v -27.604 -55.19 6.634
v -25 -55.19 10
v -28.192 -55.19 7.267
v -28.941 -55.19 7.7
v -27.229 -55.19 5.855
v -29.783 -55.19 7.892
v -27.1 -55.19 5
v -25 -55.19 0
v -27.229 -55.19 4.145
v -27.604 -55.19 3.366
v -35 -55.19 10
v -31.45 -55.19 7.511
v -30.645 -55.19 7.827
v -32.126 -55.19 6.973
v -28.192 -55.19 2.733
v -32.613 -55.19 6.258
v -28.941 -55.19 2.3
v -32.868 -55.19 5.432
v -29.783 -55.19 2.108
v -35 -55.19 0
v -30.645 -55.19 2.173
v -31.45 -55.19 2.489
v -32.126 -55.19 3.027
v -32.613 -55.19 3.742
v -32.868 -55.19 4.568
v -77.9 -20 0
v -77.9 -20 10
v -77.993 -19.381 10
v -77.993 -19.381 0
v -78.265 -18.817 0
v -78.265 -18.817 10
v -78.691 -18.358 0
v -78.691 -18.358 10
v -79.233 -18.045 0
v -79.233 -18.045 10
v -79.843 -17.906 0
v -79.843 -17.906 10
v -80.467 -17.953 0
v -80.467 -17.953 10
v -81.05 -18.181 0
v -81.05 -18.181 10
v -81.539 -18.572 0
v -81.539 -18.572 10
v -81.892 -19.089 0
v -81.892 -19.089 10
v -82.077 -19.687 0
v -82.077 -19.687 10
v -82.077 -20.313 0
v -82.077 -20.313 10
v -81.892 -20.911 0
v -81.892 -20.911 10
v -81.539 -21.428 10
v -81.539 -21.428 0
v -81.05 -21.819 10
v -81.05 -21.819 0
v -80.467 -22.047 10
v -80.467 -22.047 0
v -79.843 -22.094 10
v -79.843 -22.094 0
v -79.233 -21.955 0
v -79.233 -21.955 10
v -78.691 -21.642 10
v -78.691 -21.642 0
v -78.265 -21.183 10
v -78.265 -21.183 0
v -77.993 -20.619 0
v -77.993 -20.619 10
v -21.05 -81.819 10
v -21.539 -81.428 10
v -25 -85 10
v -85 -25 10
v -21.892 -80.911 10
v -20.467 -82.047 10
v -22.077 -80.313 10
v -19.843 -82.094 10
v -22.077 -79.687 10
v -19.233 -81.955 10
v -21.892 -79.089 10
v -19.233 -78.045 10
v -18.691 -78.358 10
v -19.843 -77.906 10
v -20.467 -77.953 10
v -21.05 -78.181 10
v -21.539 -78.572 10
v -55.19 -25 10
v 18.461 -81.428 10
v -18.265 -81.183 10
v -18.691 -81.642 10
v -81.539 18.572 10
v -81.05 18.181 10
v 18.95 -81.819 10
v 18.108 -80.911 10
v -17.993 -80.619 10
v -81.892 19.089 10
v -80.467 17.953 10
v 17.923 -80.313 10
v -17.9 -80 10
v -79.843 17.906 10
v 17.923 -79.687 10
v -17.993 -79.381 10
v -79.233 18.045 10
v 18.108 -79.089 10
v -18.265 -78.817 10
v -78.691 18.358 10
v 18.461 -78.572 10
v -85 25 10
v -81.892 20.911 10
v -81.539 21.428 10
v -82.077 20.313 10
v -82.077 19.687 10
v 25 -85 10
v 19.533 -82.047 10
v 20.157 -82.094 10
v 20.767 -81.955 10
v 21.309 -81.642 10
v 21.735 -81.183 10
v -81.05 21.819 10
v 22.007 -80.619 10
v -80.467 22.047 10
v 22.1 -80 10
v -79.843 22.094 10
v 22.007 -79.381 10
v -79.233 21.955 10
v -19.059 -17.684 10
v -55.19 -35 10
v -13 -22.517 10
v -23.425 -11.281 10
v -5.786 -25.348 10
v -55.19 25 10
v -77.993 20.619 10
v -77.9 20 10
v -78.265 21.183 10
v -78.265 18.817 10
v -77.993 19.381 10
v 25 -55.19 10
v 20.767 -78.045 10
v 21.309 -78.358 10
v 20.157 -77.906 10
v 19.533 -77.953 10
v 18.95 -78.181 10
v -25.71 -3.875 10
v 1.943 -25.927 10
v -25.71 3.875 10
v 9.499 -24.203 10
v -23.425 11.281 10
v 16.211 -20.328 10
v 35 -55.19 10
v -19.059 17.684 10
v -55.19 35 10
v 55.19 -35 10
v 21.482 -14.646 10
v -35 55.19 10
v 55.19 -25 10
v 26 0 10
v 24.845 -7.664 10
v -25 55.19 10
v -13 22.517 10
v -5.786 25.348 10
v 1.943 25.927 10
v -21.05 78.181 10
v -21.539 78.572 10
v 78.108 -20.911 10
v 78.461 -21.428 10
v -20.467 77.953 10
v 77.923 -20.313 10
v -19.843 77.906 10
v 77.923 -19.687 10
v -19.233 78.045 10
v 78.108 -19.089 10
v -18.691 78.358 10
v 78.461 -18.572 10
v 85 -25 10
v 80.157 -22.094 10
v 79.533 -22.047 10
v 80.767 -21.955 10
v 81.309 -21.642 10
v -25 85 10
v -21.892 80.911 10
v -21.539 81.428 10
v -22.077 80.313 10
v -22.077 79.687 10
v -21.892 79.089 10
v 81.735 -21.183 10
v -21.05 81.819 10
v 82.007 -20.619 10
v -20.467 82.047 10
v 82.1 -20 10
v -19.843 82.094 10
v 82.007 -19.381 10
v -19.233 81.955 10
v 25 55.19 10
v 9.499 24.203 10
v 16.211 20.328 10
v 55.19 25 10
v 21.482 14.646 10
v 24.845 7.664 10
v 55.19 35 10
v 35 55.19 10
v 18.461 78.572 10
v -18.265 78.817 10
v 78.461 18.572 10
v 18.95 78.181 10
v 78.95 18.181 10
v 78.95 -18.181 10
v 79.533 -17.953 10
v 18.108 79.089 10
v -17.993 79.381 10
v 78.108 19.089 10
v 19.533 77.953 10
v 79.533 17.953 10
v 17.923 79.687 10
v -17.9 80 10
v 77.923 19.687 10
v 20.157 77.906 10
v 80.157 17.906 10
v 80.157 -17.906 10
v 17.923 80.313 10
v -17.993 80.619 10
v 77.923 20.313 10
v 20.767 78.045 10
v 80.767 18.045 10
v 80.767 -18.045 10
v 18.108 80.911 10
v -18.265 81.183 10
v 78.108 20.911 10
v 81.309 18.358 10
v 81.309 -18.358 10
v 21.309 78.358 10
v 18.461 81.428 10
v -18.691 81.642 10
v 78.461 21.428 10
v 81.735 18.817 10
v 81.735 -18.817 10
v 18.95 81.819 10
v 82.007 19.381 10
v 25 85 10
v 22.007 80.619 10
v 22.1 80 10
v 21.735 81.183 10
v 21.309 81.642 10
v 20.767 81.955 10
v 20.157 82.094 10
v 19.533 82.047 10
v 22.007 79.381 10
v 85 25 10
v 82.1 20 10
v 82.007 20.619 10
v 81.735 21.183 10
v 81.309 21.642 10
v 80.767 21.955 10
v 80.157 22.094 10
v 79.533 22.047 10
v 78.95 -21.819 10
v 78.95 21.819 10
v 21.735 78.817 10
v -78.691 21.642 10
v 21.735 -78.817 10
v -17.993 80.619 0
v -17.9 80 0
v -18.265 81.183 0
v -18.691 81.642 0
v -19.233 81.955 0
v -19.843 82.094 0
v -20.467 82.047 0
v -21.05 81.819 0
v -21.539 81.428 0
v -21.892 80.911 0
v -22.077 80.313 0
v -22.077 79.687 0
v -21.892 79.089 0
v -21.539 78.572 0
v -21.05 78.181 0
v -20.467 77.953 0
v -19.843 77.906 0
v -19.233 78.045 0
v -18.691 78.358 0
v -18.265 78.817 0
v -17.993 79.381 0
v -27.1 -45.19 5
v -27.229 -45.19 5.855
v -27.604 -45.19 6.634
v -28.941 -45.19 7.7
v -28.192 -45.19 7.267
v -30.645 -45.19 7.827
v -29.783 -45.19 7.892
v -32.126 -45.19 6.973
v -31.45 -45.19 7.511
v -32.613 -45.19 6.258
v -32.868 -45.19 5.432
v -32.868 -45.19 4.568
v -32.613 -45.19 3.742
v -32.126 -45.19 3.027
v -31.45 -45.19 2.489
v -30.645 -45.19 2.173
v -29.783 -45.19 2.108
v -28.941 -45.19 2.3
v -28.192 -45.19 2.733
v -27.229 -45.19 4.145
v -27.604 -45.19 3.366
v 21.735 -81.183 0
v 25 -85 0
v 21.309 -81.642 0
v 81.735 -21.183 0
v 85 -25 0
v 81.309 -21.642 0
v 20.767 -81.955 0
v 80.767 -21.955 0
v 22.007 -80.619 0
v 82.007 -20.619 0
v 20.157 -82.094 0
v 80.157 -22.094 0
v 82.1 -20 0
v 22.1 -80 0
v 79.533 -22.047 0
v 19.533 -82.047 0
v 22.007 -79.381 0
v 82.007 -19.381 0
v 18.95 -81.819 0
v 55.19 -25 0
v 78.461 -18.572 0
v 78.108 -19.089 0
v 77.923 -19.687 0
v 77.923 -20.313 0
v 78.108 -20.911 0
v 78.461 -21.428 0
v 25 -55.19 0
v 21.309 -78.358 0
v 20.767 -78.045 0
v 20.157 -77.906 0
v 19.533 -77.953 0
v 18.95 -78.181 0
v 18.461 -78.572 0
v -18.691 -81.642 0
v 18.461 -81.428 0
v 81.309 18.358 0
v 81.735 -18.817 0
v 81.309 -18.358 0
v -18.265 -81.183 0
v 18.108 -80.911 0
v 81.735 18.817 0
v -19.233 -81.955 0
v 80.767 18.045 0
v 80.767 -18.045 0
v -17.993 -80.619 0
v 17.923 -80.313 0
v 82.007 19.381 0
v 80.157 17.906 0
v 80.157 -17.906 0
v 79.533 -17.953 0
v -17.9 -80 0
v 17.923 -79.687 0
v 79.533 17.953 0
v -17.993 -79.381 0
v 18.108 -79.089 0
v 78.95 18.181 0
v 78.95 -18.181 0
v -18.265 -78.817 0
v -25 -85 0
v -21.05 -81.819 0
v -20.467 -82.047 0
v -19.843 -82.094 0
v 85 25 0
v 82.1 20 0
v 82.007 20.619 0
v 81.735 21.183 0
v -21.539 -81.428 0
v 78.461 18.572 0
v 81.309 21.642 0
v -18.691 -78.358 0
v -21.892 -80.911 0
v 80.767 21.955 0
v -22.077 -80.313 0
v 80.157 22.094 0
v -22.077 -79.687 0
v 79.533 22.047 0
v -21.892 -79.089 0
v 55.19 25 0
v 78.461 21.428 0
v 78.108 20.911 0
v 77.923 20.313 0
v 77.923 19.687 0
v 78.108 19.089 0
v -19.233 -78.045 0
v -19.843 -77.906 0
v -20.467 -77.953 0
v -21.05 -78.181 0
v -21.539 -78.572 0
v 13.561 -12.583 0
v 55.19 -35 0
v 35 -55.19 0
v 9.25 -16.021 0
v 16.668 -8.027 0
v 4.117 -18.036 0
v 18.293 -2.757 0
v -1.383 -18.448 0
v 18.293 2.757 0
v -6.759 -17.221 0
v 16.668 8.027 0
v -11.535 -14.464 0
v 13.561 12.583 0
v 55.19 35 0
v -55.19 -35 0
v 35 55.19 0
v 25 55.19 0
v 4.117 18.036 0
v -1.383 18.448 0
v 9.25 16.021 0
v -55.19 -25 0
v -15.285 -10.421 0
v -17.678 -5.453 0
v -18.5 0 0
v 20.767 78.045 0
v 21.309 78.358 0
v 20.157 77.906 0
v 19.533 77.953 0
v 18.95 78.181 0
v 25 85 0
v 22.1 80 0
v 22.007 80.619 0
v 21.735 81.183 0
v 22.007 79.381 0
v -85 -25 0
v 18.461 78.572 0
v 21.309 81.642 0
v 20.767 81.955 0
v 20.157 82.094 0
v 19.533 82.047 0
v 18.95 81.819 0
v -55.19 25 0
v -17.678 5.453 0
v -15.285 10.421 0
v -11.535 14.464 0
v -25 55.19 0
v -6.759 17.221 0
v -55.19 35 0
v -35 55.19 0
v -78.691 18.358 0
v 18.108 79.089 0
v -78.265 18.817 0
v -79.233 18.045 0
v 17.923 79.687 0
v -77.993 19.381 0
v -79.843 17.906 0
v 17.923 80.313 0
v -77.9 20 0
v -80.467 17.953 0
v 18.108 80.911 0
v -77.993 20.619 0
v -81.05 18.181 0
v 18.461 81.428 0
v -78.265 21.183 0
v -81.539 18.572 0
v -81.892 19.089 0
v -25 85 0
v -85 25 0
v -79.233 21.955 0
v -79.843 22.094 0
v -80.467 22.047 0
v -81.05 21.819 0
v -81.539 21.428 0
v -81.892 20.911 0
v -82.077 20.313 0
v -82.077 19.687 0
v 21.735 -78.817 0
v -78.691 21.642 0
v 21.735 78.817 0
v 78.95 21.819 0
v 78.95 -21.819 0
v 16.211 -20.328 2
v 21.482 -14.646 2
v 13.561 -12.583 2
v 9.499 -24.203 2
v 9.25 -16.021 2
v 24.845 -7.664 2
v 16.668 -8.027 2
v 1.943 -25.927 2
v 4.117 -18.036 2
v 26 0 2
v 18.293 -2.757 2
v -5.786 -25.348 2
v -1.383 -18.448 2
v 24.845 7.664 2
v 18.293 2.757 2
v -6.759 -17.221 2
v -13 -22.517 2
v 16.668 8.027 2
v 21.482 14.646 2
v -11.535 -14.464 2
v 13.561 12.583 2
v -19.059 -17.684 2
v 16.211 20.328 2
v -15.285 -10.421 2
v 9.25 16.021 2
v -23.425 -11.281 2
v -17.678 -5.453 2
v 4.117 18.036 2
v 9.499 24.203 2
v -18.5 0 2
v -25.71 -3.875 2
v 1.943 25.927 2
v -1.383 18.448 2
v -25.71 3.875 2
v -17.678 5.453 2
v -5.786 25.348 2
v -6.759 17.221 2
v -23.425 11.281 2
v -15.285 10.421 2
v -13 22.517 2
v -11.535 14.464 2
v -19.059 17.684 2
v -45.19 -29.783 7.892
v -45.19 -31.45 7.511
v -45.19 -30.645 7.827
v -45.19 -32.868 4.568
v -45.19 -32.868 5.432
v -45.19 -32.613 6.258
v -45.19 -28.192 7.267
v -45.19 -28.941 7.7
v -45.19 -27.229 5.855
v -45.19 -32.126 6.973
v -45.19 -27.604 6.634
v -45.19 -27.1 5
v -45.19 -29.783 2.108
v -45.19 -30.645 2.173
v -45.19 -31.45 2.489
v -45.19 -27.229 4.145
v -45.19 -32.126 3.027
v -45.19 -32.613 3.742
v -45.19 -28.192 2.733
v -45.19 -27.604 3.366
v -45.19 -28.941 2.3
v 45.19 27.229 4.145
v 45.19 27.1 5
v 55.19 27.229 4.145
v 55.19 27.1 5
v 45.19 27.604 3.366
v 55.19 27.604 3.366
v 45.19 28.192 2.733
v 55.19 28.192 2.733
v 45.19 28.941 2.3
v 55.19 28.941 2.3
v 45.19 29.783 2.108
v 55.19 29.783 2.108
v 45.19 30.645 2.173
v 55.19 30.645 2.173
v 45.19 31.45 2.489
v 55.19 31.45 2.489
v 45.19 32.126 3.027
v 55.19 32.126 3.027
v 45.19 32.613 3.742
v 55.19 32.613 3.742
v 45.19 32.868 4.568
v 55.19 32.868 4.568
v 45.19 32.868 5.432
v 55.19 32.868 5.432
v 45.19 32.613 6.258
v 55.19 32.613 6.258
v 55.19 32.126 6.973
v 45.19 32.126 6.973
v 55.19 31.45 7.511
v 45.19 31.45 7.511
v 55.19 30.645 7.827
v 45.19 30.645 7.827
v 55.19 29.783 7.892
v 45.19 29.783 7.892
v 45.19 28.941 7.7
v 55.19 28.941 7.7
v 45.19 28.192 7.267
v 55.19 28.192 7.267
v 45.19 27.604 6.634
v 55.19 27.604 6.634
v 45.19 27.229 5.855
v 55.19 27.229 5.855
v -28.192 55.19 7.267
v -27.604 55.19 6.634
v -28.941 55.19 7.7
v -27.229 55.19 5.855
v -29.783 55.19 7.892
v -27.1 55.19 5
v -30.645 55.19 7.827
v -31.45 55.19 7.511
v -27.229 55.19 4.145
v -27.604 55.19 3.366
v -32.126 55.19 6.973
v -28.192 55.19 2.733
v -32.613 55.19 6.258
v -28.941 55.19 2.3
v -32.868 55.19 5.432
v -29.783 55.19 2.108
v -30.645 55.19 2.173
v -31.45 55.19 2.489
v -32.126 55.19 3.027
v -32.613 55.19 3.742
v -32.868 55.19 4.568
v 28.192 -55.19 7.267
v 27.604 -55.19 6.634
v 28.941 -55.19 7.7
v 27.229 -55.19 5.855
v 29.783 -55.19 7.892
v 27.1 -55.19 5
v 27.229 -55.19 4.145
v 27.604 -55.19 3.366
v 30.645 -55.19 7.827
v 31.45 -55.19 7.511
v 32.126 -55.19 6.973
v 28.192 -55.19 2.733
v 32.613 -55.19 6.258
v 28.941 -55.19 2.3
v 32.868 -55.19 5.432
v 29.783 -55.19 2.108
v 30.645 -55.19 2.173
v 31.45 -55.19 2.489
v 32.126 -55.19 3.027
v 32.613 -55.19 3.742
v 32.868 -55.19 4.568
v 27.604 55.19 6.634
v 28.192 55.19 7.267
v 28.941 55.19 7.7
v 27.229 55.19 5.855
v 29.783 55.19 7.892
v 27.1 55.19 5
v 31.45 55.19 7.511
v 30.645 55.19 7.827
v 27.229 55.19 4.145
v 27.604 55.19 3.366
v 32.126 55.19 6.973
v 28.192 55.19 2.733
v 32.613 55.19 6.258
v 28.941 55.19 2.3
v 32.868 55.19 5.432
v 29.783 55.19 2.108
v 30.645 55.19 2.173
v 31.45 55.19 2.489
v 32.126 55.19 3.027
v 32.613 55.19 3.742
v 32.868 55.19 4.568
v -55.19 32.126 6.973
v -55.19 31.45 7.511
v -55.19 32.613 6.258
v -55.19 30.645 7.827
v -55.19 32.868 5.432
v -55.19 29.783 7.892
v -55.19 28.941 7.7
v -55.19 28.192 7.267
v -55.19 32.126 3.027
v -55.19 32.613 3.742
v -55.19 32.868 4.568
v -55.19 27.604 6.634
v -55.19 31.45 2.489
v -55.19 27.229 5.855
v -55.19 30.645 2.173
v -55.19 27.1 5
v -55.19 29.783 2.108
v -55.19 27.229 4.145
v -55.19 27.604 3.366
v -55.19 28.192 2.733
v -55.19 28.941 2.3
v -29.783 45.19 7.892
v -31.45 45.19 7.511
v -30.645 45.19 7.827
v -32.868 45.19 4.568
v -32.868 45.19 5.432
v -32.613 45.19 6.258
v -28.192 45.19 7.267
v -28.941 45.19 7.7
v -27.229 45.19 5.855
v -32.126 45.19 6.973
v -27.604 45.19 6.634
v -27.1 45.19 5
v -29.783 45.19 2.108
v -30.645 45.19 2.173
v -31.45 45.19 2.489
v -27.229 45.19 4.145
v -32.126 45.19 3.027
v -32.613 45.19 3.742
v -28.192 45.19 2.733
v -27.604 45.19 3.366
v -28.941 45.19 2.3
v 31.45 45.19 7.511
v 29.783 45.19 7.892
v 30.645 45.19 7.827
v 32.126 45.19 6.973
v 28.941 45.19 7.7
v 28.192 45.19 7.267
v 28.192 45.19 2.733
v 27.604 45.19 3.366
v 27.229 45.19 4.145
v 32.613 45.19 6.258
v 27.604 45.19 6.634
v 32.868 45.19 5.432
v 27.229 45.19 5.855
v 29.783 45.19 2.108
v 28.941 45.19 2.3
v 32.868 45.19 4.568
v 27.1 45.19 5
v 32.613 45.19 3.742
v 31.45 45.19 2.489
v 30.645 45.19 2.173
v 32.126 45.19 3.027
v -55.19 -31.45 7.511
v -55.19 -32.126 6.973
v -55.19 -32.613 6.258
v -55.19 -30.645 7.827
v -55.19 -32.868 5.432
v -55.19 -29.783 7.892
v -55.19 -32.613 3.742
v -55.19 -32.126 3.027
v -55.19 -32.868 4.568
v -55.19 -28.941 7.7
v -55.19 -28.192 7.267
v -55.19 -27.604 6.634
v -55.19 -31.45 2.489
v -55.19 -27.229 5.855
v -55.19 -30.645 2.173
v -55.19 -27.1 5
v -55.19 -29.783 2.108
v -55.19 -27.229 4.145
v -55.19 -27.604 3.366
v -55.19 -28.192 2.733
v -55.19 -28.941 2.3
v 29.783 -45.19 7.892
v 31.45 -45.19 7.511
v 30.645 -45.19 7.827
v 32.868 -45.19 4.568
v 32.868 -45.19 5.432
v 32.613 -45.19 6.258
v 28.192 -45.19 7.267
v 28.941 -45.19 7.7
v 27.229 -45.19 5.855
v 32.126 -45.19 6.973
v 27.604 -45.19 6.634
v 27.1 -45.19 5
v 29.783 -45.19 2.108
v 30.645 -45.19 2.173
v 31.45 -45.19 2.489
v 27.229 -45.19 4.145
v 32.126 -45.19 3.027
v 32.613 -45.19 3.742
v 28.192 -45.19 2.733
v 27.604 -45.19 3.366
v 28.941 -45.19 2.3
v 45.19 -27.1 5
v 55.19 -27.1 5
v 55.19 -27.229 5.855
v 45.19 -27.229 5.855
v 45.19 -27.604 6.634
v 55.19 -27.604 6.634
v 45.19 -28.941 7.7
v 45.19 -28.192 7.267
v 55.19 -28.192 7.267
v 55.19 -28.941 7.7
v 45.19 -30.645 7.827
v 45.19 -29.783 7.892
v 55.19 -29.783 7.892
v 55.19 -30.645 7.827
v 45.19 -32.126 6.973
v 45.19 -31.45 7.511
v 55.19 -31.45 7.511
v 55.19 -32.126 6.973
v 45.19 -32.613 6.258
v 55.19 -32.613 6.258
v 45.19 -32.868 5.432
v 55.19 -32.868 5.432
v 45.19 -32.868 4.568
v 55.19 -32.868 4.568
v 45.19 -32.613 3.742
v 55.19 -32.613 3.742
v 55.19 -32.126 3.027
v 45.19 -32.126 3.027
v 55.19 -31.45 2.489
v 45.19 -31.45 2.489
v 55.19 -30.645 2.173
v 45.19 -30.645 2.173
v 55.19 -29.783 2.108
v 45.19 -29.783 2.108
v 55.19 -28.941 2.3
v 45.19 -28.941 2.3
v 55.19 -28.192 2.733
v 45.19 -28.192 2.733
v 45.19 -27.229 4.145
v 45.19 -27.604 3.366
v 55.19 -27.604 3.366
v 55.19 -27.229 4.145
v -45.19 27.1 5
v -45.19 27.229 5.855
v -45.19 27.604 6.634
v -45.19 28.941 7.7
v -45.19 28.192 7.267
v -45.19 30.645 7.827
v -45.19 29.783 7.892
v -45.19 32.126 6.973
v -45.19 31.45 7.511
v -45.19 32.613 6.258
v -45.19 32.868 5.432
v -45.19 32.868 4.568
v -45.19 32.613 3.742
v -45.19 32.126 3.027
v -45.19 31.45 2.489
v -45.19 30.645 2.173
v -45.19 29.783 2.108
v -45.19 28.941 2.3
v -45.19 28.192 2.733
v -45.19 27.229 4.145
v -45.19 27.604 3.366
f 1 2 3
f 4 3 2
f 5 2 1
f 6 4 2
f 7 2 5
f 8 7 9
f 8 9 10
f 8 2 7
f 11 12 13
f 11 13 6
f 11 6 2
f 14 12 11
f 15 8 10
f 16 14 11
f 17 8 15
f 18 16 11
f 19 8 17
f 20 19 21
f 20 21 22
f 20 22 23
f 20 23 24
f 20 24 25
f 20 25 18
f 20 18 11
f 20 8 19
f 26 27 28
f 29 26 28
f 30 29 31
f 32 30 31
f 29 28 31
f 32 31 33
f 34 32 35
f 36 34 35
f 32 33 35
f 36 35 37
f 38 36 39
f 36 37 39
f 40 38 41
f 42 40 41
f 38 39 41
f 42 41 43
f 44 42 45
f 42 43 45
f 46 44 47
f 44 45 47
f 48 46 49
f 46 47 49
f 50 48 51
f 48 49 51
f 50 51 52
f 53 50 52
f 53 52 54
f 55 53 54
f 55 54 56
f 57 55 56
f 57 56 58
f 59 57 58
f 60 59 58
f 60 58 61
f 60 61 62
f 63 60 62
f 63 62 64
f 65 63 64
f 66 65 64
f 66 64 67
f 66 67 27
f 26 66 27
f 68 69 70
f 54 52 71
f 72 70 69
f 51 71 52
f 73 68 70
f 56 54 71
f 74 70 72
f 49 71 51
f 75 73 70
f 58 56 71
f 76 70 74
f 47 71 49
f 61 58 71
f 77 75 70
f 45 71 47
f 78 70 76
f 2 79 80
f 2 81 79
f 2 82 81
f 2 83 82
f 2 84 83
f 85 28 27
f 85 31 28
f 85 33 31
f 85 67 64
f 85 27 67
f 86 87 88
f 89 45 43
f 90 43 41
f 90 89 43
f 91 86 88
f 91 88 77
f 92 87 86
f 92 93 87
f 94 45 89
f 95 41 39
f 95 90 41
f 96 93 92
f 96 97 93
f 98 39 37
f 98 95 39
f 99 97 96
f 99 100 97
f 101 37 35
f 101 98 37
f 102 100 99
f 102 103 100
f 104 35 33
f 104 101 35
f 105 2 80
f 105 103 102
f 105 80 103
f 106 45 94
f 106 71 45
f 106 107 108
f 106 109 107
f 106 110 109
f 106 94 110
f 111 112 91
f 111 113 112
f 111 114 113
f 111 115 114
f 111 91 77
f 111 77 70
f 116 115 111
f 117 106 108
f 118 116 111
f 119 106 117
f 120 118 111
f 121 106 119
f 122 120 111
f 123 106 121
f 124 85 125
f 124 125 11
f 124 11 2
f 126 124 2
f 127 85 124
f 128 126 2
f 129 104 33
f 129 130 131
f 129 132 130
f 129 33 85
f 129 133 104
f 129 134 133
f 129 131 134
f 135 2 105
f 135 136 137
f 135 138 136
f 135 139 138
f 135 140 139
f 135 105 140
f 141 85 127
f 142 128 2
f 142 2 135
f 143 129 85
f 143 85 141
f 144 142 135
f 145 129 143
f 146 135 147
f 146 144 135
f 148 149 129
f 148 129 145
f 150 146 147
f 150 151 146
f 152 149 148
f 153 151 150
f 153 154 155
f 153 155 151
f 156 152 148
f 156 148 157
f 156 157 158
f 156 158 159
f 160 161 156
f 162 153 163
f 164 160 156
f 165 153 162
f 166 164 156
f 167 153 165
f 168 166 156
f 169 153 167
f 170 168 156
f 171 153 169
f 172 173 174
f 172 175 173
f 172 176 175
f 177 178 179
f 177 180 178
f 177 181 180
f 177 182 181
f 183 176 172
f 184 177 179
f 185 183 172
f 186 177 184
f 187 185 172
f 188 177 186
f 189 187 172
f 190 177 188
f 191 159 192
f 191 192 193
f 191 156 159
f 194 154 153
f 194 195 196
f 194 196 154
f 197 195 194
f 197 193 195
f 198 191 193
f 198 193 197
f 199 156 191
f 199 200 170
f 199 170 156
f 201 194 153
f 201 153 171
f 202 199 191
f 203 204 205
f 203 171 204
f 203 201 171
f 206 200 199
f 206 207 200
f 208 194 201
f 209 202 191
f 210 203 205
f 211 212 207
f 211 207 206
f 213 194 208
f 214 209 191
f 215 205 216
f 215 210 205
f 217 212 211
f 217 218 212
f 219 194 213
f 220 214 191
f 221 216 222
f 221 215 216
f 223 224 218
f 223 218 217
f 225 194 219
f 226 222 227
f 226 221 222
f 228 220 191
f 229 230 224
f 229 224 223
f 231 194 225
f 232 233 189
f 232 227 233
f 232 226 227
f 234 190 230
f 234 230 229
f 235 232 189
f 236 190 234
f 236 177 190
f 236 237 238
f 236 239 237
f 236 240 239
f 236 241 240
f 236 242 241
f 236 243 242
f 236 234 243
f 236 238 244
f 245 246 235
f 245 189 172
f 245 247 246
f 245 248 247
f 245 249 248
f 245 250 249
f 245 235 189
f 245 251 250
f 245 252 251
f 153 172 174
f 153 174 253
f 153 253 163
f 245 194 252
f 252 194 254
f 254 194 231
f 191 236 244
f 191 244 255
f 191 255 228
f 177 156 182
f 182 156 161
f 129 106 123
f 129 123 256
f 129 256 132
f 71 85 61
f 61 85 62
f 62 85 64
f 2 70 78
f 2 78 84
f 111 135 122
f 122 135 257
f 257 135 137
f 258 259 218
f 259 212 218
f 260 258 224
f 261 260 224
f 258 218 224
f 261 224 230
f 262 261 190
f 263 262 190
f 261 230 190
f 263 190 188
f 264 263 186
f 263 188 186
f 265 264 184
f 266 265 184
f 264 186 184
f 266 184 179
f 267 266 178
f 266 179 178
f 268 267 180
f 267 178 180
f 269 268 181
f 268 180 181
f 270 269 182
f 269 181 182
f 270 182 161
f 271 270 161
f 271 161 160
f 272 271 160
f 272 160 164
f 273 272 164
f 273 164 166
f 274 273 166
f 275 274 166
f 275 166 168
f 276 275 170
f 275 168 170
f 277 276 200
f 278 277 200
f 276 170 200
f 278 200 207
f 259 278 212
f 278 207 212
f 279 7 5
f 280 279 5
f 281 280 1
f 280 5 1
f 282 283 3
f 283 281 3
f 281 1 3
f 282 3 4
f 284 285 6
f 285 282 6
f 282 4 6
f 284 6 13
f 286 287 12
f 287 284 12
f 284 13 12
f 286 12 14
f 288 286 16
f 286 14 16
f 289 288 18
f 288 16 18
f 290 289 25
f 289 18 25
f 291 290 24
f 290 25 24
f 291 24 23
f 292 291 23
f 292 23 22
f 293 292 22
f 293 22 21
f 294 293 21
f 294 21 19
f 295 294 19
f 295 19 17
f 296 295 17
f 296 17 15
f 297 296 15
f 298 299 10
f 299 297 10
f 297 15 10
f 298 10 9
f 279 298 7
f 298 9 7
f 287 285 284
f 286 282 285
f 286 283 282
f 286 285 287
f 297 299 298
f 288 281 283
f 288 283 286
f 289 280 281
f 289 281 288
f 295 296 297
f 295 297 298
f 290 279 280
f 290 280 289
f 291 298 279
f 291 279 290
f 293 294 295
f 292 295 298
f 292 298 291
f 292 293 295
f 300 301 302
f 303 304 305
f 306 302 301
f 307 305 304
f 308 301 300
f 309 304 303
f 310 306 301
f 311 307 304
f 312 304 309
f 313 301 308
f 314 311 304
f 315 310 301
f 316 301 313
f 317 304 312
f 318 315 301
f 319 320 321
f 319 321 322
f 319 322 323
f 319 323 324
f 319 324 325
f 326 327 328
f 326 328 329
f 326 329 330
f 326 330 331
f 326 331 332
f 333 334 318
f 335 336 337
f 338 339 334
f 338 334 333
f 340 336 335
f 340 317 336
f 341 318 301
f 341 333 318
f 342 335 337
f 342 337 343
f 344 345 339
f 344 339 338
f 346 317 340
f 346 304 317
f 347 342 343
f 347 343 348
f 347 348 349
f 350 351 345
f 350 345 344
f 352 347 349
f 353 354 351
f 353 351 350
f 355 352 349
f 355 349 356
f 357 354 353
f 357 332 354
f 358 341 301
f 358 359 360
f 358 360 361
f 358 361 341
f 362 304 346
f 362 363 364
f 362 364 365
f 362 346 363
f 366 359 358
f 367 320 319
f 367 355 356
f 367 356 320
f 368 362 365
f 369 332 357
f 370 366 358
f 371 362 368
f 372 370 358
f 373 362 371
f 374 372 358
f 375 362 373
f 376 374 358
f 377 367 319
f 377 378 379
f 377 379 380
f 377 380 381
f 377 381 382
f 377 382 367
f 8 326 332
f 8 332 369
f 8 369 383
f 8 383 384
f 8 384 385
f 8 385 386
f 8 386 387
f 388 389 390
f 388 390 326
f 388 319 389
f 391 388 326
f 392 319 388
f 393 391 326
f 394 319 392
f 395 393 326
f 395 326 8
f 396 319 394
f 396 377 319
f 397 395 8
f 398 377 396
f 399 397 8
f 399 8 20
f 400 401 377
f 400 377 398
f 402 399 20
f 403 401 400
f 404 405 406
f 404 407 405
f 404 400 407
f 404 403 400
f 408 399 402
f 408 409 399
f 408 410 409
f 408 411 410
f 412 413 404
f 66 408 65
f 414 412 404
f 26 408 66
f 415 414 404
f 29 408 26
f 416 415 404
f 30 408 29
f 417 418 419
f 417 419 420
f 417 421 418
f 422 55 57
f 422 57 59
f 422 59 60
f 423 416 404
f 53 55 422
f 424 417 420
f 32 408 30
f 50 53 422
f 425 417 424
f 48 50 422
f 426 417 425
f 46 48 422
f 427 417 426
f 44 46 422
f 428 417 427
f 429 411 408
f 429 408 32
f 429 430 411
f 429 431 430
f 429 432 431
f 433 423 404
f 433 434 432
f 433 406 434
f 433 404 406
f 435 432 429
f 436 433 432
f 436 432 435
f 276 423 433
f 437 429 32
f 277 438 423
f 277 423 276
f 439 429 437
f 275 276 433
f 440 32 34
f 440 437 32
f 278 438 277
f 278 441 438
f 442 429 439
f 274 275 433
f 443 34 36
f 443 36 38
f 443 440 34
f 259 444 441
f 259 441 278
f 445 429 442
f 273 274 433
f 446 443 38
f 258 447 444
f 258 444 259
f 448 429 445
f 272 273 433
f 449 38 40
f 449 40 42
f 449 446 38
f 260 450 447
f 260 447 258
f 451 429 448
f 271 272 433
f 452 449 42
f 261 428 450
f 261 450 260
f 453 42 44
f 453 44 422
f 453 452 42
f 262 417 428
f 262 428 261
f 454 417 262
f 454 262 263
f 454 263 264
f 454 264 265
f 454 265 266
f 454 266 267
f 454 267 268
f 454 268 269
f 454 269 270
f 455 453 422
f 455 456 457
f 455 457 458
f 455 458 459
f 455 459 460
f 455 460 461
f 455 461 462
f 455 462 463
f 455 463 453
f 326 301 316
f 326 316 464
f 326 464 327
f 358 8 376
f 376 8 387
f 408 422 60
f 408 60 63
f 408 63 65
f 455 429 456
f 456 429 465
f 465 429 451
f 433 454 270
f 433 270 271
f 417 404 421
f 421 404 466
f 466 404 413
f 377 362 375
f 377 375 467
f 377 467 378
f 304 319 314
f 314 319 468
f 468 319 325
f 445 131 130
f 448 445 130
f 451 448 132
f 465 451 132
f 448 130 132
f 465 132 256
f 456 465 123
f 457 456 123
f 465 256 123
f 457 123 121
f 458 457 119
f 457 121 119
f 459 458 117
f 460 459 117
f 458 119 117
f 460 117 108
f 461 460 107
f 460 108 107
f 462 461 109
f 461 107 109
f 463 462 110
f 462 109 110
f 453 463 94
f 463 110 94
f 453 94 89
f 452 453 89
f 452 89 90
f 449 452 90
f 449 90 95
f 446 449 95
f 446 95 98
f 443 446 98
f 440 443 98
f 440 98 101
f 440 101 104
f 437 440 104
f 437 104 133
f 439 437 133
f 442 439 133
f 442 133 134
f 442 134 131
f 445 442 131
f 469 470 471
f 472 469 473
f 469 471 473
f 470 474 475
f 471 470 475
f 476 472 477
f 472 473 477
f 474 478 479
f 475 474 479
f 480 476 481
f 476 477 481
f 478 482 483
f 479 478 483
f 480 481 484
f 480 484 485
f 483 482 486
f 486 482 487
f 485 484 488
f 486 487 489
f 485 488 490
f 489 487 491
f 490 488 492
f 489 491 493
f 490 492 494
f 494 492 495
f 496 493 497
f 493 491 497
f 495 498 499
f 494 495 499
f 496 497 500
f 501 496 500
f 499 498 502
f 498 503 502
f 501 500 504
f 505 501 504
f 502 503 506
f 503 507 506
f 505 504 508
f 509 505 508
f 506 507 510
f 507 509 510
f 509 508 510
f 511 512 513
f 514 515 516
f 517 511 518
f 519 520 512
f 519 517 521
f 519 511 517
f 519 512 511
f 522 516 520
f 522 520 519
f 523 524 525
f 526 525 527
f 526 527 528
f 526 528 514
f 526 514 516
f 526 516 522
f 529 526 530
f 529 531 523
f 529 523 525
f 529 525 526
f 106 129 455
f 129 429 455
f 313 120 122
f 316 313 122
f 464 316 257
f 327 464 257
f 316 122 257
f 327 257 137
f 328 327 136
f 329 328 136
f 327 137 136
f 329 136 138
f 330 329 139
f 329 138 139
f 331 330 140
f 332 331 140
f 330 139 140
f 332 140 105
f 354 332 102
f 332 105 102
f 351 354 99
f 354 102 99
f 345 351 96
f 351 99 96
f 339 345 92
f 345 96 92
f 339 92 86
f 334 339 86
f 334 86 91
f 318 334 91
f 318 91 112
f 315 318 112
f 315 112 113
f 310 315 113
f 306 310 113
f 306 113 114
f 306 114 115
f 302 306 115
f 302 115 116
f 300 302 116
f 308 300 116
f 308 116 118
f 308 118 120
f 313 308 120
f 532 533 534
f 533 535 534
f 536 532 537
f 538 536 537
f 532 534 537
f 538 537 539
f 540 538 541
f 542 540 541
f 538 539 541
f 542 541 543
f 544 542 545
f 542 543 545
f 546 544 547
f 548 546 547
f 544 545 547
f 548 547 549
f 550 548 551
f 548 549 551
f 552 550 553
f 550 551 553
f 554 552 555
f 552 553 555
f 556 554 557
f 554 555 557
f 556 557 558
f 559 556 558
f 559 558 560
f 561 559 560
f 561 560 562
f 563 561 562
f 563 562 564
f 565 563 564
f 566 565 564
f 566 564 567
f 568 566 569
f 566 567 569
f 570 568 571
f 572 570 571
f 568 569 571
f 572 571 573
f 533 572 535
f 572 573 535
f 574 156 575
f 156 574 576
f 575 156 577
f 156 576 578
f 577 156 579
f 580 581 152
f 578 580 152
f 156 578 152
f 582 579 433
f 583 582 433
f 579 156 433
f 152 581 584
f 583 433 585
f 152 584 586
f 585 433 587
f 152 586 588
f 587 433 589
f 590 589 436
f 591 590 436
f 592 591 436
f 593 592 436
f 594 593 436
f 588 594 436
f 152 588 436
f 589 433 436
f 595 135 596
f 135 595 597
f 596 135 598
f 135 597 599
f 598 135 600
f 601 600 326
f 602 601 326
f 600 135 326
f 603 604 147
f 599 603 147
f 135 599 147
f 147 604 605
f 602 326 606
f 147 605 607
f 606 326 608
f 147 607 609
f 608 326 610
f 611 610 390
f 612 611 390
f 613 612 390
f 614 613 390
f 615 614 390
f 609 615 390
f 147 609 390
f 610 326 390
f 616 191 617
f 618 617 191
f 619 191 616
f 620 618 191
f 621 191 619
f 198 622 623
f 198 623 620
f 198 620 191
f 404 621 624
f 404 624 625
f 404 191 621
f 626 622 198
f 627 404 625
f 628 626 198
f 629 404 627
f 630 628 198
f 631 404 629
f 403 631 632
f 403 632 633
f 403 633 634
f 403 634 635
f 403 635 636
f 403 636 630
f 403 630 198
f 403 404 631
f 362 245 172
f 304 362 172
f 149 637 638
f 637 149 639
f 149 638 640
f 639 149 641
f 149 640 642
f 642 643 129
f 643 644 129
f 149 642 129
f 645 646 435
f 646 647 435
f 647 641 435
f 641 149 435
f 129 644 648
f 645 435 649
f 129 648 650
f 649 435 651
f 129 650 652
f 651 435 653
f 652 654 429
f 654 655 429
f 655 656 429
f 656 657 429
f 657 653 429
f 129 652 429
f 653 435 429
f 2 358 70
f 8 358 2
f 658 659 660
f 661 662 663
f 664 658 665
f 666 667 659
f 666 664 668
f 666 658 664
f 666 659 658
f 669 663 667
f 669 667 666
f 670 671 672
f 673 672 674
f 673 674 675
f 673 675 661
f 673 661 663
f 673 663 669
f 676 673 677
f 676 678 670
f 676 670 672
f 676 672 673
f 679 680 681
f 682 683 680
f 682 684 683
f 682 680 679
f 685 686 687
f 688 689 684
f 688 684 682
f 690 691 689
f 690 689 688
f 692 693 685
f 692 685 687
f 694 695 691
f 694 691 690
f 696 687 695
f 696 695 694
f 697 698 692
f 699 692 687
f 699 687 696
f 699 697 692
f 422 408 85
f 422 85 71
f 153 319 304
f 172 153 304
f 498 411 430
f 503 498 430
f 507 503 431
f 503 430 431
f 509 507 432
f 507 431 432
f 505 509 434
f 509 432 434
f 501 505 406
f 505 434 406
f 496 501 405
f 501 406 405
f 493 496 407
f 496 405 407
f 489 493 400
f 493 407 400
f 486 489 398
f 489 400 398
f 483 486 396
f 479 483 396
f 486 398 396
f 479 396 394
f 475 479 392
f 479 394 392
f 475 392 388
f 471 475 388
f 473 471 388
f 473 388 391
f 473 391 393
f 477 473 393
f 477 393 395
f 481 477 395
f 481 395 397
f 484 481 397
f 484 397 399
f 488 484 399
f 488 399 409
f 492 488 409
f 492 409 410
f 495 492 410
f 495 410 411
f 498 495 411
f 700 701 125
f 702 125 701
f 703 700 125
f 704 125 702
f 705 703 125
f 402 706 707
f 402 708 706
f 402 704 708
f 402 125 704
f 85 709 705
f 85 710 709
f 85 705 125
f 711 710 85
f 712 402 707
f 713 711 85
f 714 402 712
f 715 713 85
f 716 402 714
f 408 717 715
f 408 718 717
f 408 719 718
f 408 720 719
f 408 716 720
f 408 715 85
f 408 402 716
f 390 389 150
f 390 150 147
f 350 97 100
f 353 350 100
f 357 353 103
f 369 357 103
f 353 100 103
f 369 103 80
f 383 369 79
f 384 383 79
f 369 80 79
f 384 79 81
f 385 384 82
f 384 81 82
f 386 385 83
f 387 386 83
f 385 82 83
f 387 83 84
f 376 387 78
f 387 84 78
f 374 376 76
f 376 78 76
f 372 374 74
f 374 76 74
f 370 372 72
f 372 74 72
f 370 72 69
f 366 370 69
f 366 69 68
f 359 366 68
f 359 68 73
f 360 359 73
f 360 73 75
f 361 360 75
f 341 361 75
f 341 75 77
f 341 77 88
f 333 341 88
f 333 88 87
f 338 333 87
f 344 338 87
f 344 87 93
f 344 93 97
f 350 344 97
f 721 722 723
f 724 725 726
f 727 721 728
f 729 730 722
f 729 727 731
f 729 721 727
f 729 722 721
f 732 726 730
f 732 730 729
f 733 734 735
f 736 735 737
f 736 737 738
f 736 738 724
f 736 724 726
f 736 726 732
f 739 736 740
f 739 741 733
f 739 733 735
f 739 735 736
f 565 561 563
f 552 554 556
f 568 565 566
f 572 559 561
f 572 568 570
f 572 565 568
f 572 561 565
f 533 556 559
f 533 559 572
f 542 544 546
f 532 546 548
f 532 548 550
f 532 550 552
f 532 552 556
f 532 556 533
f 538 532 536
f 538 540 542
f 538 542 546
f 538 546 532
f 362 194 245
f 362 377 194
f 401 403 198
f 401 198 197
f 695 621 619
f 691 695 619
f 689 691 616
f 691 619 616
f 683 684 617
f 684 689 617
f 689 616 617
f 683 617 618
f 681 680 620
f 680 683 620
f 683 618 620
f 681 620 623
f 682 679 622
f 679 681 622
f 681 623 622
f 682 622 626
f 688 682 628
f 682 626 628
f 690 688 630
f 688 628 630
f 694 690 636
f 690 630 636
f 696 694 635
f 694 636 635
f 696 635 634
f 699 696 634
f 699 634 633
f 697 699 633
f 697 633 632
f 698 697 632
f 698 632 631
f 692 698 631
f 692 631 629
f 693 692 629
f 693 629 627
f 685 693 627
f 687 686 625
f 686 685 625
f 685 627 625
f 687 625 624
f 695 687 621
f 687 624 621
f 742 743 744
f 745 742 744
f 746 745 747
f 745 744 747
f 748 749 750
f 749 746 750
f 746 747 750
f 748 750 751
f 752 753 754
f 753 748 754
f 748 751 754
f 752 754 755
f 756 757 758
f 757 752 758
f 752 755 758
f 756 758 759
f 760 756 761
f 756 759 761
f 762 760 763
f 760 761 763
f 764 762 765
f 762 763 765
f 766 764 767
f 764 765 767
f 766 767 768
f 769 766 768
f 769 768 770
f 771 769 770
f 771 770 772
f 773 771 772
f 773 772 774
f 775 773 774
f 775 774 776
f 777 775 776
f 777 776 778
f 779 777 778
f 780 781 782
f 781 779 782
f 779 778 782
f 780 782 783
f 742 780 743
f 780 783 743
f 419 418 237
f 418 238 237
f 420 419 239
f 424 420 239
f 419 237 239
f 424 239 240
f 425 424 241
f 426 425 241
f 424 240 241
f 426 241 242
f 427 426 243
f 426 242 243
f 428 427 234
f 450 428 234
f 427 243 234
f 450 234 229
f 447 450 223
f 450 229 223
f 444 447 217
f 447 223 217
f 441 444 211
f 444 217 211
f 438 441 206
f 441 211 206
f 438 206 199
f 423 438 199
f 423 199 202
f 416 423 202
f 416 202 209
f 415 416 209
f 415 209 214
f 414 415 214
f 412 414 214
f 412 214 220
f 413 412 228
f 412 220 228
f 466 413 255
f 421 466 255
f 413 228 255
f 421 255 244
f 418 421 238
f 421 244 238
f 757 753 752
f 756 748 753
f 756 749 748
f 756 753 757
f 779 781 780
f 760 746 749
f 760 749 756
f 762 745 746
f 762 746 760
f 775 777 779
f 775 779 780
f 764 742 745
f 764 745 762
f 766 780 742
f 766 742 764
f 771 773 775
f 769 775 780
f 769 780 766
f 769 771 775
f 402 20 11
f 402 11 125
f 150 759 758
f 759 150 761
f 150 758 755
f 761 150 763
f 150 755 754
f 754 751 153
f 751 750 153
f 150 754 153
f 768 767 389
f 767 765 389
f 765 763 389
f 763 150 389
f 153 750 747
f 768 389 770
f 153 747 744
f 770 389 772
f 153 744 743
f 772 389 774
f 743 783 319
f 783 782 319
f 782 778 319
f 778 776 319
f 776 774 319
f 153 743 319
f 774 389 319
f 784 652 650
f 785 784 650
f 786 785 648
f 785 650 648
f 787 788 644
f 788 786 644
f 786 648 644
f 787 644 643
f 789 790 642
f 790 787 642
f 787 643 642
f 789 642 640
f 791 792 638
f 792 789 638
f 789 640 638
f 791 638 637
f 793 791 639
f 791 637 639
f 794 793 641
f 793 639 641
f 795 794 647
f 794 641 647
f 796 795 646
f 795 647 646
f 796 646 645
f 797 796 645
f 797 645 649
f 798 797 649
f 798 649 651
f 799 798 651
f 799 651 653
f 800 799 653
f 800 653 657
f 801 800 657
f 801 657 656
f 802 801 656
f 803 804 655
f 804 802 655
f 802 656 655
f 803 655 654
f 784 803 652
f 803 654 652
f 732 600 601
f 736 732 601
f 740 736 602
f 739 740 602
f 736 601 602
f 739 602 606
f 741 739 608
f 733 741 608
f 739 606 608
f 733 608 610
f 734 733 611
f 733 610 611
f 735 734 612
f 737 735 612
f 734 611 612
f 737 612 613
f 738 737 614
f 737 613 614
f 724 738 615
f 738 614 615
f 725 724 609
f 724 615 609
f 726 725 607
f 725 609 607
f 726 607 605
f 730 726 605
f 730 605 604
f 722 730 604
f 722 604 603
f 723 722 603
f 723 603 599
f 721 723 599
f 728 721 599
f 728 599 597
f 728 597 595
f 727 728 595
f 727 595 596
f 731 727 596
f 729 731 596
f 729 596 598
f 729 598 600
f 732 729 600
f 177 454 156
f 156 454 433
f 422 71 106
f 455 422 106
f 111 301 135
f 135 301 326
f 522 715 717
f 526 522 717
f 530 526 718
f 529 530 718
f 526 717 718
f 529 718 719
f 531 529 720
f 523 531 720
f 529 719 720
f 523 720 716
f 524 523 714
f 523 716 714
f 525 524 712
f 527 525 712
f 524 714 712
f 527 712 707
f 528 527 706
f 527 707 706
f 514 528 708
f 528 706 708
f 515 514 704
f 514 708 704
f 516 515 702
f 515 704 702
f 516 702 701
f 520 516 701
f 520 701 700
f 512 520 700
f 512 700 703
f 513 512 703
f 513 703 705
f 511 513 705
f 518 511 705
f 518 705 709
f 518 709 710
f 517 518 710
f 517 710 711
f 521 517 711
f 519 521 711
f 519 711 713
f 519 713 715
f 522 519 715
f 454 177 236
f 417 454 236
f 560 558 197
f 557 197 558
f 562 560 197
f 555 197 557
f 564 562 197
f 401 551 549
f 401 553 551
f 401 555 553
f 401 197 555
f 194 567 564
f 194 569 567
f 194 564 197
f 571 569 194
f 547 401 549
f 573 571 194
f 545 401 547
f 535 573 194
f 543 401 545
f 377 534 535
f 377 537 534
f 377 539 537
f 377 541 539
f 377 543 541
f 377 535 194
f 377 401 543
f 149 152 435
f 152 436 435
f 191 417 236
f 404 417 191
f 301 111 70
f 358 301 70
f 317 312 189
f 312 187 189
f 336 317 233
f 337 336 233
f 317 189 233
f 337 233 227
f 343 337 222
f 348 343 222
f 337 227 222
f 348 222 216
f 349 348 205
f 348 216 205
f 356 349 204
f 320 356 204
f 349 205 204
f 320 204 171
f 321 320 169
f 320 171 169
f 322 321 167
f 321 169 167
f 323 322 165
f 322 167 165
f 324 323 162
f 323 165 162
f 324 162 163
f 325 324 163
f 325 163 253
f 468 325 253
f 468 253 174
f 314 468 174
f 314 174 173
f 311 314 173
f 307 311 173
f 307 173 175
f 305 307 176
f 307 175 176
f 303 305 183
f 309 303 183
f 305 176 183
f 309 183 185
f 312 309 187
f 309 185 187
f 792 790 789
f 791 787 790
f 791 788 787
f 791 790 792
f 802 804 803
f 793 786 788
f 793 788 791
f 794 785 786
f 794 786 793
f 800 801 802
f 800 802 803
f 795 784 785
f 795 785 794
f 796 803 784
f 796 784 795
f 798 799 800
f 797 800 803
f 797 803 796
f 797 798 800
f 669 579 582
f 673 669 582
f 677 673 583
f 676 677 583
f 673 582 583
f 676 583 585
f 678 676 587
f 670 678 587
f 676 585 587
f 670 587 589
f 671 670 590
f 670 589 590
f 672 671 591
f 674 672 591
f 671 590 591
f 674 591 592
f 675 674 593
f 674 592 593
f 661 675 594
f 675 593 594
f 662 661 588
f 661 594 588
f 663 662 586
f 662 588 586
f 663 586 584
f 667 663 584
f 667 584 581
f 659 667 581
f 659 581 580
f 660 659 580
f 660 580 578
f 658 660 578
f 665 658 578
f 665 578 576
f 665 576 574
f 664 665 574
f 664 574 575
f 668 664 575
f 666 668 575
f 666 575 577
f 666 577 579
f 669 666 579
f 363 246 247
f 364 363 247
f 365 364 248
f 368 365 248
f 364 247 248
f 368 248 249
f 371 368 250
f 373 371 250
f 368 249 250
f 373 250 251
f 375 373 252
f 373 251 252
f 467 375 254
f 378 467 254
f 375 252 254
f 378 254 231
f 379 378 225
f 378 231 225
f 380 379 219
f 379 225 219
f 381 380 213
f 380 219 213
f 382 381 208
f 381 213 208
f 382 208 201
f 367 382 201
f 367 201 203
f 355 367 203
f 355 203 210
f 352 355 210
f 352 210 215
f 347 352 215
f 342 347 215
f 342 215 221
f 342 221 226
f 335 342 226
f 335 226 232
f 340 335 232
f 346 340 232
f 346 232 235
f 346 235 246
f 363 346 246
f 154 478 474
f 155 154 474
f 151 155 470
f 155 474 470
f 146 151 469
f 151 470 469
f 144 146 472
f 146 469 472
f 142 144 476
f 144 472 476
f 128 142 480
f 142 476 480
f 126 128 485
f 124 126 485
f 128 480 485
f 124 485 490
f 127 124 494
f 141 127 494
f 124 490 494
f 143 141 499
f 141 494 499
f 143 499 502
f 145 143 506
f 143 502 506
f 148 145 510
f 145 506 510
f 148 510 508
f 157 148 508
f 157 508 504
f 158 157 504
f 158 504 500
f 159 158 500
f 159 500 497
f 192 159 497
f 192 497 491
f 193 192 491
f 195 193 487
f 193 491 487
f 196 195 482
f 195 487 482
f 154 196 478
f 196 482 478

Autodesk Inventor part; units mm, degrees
ref_plane "YZ Plane" through (0, 0, 0) normal (1, 0, 0) x (0, 1, 0)
ref_plane "XZ Plane" through (0, 0, 0) normal (0, 1, 0) x (-1, 0, 0)
ref_plane "XY Plane" through (0, 0, 0) normal (0, 0, 1) x (1, 0, 0)
sketch "Sketch1" plane through (0, 0, 0) normal (0, 0, 1) x (1, 0, 0)
  line L0 (-25, 65.19) -> (25, 65.19)
  line L1 (65.19, 25) -> (65.19, -25)
  line L2 (25, -65.19) -> (-25, -65.19)
  line L3 (-65.19, -25) -> (-65.19, 25)
  line L4 (-50.6308, 50.6308) -> (50.6308, -50.6308) construction
  line L5 (50, 50) -> (-50, -50) construction
  line L6 (-40, 40) -> (-50.6308, 50.6308) construction
  line L7 (-25, 65.19) -> (-25, 55.19)
  line L8 (-25, 55.19) -> (-35, 55.19)
  line L9 (-55.19, 35) -> (-55.19, 25)
  line L10 (-55.19, 25) -> (-65.19, 25)
  circle A0 centre (0, 0) radius 26
  line L11 (0, 28.0827) -> (0, 0)
  line L12 (0, 0) -> (17.6422, 0)
  line L13 (25, 65.19) -> (25, 55.19)
  line L14 (25, 55.19) -> (35, 55.19)
  line L15 (55.19, 35) -> (55.19, 25)
  line L16 (55.19, 25) -> (65.19, 25)
  line L17 (-25, -65.19) -> (-25, -55.19)
  line L18 (-25, -55.19) -> (-35, -55.19)
  line L19 (-55.19, -35) -> (-55.19, -25)
  line L20 (-55.19, -25) -> (-65.19, -25)
  line L21 (25, -65.19) -> (25, -55.19)
  line L22 (25, -55.19) -> (35, -55.19)
  line L23 (55.19, -35) -> (55.19, -25)
  line L24 (55.19, -25) -> (65.19, -25)
  line L25 (-35, 55.19) -> (-55.19, 35)
  line L26 (35, 55.19) -> (55.19, 35)
  line L27 (55.19, -35) -> (35, -55.19)
  line L28 (-35, -55.19) -> (-55.19, -35)
  point P0 (-45.3154, 45.3154)
  point P1 (-55.19, 55.19)
  point P2 (55.19, 55.19)
  point P3 (-55.19, -55.19)
  point P4 (55.19, -55.19)
  dimension "d9" = 130.38
  dimension "d19" = 10
  dimension "d20" = 52
  dimension "d40" = 130.38
  dimension "d45" = 10
  dimension "d58" = 50
  dimension "d59" = 50
  dimension "d60" = 20.19
  dimension "d61" = 20.19
  dimension "d62" = 20.19
  dimension "d63" = 20.19
  dimension "d64" = 20.19
  dimension "d65" = 20.19
  dimension "d66" = 20.19
  dimension "d67" = 20.19
  dimension "d79" = 10
extrude "Extrusion1" add sketch "Sketch1" along normal blind 10
sketch "Sketch3" plane through (0, 0, 10) normal (0, 0, 1) x (1, 0, 0)
  line L0 (25, 65.19) -> (-25, 65.19) projected
  line L1 (25, 65.19) -> (-25, 65.19)
  line L2 (-25, 65.19) -> (-25, 85)
  line L3 (-25, 85) -> (25, 85)
  line L4 (25, 85) -> (25, 65.19)
  line L5 (-25, 65.19) -> (-25, 55.19) projected
  circle A0 centre (-20, 80) radius 2.1
  line L6 (0, 0) -> (0, 7.5781)
  circle A1 centre (20, 80) radius 2.1
  circle A2 centre (-80, -20) radius 2.1
  circle A3 centre (-80, 20) radius 2.1
  circle A4 centre (20, -80) radius 2.1
  circle A5 centre (-20, -80) radius 2.1
  circle A6 centre (80, 20) radius 2.1
  circle A7 centre (80, -20) radius 2.1
  line L7 (25, 55.19) -> (25, 65.19) projected
  line L8 (-65.19, 25) -> (-65.19, -25)
  line L9 (-85, 25) -> (-65.19, 25)
  line L10 (-85, -25) -> (-85, 25)
  line L11 (-65.19, -25) -> (-85, -25)
  line L12 (-25, -65.19) -> (25, -65.19)
  line L13 (-25, -85) -> (-25, -65.19)
  line L14 (25, -85) -> (-25, -85)
  line L15 (25, -65.19) -> (25, -85)
  line L16 (65.19, -25) -> (65.19, 25)
  line L17 (85, -25) -> (65.19, -25)
  line L18 (85, 25) -> (85, -25)
  line L19 (65.19, 25) -> (85, 25)
  point P0 (-25, 60.19)
  point P1 (-25, 75.095)
  point P2 (-75.095, -25)
  point P3 (25, -75.095)
  point P4 (75.095, 25)
  dimension "d31" = 4.2
  dimension "d35" = 360
  dimension "d43" = 360
  dimension "d49" = 5
  dimension "d50" = 40
  dimension "d51" = 5
  dimension "d80" = 170
extrude "Extrusion3" add sketch "Sketch3" against normal up to surface (10 mm away)
sketch "Sketch5" plane through (0, 0, 0) normal (0, 0, -1) x (-1, 0, 0)
  circle A0 centre (0, 0) radius 26 projected
  circle A1 centre (0, 0) radius 18.5
  dimension "d55" = 37
extrude "Extrusion5" add sketch "Sketch5" against normal blind 2
sketch "Sketch6" plane through (-35, 55.19, 0) normal (0, 1, 0) x (1, 0, 0)
  circle A0 centre (5, -5) radius 2.9
  line L0 (10, -10) -> (0, -10) projected
  line L1 (10, -10) -> (10, 0) projected
  point P0 (35, 0)
  dimension "d68" = 5
  dimension "d69" = 5
  dimension "d70" = 5.8
extrude "Extrusion6" cut sketch "Sketch6" against normal blind 10
mirror "Mirror1" about plane through (0, 0, 0) normal (1, 0, 0) of "Extrusion6"
pattern_circular "Circular Pattern2" count 4 over 360 about axis through (0, 0, 0) along (0, 0, 1) of "Extrusion6", "Mirror1"
equation "\"d9\" = d40"
equation "\"d59\" = d58"
equation "\"d61\" = d60"
equation "\"d62\" = d60"
equation "\"d63\" = d62"
equation "\"d64\" = d60"
equation "\"d65\" = d64"
equation "\"d66\" = d60"
equation "\"d67\" = d66"
properties part number "gearbox_base" material "PMMA Plastic"
